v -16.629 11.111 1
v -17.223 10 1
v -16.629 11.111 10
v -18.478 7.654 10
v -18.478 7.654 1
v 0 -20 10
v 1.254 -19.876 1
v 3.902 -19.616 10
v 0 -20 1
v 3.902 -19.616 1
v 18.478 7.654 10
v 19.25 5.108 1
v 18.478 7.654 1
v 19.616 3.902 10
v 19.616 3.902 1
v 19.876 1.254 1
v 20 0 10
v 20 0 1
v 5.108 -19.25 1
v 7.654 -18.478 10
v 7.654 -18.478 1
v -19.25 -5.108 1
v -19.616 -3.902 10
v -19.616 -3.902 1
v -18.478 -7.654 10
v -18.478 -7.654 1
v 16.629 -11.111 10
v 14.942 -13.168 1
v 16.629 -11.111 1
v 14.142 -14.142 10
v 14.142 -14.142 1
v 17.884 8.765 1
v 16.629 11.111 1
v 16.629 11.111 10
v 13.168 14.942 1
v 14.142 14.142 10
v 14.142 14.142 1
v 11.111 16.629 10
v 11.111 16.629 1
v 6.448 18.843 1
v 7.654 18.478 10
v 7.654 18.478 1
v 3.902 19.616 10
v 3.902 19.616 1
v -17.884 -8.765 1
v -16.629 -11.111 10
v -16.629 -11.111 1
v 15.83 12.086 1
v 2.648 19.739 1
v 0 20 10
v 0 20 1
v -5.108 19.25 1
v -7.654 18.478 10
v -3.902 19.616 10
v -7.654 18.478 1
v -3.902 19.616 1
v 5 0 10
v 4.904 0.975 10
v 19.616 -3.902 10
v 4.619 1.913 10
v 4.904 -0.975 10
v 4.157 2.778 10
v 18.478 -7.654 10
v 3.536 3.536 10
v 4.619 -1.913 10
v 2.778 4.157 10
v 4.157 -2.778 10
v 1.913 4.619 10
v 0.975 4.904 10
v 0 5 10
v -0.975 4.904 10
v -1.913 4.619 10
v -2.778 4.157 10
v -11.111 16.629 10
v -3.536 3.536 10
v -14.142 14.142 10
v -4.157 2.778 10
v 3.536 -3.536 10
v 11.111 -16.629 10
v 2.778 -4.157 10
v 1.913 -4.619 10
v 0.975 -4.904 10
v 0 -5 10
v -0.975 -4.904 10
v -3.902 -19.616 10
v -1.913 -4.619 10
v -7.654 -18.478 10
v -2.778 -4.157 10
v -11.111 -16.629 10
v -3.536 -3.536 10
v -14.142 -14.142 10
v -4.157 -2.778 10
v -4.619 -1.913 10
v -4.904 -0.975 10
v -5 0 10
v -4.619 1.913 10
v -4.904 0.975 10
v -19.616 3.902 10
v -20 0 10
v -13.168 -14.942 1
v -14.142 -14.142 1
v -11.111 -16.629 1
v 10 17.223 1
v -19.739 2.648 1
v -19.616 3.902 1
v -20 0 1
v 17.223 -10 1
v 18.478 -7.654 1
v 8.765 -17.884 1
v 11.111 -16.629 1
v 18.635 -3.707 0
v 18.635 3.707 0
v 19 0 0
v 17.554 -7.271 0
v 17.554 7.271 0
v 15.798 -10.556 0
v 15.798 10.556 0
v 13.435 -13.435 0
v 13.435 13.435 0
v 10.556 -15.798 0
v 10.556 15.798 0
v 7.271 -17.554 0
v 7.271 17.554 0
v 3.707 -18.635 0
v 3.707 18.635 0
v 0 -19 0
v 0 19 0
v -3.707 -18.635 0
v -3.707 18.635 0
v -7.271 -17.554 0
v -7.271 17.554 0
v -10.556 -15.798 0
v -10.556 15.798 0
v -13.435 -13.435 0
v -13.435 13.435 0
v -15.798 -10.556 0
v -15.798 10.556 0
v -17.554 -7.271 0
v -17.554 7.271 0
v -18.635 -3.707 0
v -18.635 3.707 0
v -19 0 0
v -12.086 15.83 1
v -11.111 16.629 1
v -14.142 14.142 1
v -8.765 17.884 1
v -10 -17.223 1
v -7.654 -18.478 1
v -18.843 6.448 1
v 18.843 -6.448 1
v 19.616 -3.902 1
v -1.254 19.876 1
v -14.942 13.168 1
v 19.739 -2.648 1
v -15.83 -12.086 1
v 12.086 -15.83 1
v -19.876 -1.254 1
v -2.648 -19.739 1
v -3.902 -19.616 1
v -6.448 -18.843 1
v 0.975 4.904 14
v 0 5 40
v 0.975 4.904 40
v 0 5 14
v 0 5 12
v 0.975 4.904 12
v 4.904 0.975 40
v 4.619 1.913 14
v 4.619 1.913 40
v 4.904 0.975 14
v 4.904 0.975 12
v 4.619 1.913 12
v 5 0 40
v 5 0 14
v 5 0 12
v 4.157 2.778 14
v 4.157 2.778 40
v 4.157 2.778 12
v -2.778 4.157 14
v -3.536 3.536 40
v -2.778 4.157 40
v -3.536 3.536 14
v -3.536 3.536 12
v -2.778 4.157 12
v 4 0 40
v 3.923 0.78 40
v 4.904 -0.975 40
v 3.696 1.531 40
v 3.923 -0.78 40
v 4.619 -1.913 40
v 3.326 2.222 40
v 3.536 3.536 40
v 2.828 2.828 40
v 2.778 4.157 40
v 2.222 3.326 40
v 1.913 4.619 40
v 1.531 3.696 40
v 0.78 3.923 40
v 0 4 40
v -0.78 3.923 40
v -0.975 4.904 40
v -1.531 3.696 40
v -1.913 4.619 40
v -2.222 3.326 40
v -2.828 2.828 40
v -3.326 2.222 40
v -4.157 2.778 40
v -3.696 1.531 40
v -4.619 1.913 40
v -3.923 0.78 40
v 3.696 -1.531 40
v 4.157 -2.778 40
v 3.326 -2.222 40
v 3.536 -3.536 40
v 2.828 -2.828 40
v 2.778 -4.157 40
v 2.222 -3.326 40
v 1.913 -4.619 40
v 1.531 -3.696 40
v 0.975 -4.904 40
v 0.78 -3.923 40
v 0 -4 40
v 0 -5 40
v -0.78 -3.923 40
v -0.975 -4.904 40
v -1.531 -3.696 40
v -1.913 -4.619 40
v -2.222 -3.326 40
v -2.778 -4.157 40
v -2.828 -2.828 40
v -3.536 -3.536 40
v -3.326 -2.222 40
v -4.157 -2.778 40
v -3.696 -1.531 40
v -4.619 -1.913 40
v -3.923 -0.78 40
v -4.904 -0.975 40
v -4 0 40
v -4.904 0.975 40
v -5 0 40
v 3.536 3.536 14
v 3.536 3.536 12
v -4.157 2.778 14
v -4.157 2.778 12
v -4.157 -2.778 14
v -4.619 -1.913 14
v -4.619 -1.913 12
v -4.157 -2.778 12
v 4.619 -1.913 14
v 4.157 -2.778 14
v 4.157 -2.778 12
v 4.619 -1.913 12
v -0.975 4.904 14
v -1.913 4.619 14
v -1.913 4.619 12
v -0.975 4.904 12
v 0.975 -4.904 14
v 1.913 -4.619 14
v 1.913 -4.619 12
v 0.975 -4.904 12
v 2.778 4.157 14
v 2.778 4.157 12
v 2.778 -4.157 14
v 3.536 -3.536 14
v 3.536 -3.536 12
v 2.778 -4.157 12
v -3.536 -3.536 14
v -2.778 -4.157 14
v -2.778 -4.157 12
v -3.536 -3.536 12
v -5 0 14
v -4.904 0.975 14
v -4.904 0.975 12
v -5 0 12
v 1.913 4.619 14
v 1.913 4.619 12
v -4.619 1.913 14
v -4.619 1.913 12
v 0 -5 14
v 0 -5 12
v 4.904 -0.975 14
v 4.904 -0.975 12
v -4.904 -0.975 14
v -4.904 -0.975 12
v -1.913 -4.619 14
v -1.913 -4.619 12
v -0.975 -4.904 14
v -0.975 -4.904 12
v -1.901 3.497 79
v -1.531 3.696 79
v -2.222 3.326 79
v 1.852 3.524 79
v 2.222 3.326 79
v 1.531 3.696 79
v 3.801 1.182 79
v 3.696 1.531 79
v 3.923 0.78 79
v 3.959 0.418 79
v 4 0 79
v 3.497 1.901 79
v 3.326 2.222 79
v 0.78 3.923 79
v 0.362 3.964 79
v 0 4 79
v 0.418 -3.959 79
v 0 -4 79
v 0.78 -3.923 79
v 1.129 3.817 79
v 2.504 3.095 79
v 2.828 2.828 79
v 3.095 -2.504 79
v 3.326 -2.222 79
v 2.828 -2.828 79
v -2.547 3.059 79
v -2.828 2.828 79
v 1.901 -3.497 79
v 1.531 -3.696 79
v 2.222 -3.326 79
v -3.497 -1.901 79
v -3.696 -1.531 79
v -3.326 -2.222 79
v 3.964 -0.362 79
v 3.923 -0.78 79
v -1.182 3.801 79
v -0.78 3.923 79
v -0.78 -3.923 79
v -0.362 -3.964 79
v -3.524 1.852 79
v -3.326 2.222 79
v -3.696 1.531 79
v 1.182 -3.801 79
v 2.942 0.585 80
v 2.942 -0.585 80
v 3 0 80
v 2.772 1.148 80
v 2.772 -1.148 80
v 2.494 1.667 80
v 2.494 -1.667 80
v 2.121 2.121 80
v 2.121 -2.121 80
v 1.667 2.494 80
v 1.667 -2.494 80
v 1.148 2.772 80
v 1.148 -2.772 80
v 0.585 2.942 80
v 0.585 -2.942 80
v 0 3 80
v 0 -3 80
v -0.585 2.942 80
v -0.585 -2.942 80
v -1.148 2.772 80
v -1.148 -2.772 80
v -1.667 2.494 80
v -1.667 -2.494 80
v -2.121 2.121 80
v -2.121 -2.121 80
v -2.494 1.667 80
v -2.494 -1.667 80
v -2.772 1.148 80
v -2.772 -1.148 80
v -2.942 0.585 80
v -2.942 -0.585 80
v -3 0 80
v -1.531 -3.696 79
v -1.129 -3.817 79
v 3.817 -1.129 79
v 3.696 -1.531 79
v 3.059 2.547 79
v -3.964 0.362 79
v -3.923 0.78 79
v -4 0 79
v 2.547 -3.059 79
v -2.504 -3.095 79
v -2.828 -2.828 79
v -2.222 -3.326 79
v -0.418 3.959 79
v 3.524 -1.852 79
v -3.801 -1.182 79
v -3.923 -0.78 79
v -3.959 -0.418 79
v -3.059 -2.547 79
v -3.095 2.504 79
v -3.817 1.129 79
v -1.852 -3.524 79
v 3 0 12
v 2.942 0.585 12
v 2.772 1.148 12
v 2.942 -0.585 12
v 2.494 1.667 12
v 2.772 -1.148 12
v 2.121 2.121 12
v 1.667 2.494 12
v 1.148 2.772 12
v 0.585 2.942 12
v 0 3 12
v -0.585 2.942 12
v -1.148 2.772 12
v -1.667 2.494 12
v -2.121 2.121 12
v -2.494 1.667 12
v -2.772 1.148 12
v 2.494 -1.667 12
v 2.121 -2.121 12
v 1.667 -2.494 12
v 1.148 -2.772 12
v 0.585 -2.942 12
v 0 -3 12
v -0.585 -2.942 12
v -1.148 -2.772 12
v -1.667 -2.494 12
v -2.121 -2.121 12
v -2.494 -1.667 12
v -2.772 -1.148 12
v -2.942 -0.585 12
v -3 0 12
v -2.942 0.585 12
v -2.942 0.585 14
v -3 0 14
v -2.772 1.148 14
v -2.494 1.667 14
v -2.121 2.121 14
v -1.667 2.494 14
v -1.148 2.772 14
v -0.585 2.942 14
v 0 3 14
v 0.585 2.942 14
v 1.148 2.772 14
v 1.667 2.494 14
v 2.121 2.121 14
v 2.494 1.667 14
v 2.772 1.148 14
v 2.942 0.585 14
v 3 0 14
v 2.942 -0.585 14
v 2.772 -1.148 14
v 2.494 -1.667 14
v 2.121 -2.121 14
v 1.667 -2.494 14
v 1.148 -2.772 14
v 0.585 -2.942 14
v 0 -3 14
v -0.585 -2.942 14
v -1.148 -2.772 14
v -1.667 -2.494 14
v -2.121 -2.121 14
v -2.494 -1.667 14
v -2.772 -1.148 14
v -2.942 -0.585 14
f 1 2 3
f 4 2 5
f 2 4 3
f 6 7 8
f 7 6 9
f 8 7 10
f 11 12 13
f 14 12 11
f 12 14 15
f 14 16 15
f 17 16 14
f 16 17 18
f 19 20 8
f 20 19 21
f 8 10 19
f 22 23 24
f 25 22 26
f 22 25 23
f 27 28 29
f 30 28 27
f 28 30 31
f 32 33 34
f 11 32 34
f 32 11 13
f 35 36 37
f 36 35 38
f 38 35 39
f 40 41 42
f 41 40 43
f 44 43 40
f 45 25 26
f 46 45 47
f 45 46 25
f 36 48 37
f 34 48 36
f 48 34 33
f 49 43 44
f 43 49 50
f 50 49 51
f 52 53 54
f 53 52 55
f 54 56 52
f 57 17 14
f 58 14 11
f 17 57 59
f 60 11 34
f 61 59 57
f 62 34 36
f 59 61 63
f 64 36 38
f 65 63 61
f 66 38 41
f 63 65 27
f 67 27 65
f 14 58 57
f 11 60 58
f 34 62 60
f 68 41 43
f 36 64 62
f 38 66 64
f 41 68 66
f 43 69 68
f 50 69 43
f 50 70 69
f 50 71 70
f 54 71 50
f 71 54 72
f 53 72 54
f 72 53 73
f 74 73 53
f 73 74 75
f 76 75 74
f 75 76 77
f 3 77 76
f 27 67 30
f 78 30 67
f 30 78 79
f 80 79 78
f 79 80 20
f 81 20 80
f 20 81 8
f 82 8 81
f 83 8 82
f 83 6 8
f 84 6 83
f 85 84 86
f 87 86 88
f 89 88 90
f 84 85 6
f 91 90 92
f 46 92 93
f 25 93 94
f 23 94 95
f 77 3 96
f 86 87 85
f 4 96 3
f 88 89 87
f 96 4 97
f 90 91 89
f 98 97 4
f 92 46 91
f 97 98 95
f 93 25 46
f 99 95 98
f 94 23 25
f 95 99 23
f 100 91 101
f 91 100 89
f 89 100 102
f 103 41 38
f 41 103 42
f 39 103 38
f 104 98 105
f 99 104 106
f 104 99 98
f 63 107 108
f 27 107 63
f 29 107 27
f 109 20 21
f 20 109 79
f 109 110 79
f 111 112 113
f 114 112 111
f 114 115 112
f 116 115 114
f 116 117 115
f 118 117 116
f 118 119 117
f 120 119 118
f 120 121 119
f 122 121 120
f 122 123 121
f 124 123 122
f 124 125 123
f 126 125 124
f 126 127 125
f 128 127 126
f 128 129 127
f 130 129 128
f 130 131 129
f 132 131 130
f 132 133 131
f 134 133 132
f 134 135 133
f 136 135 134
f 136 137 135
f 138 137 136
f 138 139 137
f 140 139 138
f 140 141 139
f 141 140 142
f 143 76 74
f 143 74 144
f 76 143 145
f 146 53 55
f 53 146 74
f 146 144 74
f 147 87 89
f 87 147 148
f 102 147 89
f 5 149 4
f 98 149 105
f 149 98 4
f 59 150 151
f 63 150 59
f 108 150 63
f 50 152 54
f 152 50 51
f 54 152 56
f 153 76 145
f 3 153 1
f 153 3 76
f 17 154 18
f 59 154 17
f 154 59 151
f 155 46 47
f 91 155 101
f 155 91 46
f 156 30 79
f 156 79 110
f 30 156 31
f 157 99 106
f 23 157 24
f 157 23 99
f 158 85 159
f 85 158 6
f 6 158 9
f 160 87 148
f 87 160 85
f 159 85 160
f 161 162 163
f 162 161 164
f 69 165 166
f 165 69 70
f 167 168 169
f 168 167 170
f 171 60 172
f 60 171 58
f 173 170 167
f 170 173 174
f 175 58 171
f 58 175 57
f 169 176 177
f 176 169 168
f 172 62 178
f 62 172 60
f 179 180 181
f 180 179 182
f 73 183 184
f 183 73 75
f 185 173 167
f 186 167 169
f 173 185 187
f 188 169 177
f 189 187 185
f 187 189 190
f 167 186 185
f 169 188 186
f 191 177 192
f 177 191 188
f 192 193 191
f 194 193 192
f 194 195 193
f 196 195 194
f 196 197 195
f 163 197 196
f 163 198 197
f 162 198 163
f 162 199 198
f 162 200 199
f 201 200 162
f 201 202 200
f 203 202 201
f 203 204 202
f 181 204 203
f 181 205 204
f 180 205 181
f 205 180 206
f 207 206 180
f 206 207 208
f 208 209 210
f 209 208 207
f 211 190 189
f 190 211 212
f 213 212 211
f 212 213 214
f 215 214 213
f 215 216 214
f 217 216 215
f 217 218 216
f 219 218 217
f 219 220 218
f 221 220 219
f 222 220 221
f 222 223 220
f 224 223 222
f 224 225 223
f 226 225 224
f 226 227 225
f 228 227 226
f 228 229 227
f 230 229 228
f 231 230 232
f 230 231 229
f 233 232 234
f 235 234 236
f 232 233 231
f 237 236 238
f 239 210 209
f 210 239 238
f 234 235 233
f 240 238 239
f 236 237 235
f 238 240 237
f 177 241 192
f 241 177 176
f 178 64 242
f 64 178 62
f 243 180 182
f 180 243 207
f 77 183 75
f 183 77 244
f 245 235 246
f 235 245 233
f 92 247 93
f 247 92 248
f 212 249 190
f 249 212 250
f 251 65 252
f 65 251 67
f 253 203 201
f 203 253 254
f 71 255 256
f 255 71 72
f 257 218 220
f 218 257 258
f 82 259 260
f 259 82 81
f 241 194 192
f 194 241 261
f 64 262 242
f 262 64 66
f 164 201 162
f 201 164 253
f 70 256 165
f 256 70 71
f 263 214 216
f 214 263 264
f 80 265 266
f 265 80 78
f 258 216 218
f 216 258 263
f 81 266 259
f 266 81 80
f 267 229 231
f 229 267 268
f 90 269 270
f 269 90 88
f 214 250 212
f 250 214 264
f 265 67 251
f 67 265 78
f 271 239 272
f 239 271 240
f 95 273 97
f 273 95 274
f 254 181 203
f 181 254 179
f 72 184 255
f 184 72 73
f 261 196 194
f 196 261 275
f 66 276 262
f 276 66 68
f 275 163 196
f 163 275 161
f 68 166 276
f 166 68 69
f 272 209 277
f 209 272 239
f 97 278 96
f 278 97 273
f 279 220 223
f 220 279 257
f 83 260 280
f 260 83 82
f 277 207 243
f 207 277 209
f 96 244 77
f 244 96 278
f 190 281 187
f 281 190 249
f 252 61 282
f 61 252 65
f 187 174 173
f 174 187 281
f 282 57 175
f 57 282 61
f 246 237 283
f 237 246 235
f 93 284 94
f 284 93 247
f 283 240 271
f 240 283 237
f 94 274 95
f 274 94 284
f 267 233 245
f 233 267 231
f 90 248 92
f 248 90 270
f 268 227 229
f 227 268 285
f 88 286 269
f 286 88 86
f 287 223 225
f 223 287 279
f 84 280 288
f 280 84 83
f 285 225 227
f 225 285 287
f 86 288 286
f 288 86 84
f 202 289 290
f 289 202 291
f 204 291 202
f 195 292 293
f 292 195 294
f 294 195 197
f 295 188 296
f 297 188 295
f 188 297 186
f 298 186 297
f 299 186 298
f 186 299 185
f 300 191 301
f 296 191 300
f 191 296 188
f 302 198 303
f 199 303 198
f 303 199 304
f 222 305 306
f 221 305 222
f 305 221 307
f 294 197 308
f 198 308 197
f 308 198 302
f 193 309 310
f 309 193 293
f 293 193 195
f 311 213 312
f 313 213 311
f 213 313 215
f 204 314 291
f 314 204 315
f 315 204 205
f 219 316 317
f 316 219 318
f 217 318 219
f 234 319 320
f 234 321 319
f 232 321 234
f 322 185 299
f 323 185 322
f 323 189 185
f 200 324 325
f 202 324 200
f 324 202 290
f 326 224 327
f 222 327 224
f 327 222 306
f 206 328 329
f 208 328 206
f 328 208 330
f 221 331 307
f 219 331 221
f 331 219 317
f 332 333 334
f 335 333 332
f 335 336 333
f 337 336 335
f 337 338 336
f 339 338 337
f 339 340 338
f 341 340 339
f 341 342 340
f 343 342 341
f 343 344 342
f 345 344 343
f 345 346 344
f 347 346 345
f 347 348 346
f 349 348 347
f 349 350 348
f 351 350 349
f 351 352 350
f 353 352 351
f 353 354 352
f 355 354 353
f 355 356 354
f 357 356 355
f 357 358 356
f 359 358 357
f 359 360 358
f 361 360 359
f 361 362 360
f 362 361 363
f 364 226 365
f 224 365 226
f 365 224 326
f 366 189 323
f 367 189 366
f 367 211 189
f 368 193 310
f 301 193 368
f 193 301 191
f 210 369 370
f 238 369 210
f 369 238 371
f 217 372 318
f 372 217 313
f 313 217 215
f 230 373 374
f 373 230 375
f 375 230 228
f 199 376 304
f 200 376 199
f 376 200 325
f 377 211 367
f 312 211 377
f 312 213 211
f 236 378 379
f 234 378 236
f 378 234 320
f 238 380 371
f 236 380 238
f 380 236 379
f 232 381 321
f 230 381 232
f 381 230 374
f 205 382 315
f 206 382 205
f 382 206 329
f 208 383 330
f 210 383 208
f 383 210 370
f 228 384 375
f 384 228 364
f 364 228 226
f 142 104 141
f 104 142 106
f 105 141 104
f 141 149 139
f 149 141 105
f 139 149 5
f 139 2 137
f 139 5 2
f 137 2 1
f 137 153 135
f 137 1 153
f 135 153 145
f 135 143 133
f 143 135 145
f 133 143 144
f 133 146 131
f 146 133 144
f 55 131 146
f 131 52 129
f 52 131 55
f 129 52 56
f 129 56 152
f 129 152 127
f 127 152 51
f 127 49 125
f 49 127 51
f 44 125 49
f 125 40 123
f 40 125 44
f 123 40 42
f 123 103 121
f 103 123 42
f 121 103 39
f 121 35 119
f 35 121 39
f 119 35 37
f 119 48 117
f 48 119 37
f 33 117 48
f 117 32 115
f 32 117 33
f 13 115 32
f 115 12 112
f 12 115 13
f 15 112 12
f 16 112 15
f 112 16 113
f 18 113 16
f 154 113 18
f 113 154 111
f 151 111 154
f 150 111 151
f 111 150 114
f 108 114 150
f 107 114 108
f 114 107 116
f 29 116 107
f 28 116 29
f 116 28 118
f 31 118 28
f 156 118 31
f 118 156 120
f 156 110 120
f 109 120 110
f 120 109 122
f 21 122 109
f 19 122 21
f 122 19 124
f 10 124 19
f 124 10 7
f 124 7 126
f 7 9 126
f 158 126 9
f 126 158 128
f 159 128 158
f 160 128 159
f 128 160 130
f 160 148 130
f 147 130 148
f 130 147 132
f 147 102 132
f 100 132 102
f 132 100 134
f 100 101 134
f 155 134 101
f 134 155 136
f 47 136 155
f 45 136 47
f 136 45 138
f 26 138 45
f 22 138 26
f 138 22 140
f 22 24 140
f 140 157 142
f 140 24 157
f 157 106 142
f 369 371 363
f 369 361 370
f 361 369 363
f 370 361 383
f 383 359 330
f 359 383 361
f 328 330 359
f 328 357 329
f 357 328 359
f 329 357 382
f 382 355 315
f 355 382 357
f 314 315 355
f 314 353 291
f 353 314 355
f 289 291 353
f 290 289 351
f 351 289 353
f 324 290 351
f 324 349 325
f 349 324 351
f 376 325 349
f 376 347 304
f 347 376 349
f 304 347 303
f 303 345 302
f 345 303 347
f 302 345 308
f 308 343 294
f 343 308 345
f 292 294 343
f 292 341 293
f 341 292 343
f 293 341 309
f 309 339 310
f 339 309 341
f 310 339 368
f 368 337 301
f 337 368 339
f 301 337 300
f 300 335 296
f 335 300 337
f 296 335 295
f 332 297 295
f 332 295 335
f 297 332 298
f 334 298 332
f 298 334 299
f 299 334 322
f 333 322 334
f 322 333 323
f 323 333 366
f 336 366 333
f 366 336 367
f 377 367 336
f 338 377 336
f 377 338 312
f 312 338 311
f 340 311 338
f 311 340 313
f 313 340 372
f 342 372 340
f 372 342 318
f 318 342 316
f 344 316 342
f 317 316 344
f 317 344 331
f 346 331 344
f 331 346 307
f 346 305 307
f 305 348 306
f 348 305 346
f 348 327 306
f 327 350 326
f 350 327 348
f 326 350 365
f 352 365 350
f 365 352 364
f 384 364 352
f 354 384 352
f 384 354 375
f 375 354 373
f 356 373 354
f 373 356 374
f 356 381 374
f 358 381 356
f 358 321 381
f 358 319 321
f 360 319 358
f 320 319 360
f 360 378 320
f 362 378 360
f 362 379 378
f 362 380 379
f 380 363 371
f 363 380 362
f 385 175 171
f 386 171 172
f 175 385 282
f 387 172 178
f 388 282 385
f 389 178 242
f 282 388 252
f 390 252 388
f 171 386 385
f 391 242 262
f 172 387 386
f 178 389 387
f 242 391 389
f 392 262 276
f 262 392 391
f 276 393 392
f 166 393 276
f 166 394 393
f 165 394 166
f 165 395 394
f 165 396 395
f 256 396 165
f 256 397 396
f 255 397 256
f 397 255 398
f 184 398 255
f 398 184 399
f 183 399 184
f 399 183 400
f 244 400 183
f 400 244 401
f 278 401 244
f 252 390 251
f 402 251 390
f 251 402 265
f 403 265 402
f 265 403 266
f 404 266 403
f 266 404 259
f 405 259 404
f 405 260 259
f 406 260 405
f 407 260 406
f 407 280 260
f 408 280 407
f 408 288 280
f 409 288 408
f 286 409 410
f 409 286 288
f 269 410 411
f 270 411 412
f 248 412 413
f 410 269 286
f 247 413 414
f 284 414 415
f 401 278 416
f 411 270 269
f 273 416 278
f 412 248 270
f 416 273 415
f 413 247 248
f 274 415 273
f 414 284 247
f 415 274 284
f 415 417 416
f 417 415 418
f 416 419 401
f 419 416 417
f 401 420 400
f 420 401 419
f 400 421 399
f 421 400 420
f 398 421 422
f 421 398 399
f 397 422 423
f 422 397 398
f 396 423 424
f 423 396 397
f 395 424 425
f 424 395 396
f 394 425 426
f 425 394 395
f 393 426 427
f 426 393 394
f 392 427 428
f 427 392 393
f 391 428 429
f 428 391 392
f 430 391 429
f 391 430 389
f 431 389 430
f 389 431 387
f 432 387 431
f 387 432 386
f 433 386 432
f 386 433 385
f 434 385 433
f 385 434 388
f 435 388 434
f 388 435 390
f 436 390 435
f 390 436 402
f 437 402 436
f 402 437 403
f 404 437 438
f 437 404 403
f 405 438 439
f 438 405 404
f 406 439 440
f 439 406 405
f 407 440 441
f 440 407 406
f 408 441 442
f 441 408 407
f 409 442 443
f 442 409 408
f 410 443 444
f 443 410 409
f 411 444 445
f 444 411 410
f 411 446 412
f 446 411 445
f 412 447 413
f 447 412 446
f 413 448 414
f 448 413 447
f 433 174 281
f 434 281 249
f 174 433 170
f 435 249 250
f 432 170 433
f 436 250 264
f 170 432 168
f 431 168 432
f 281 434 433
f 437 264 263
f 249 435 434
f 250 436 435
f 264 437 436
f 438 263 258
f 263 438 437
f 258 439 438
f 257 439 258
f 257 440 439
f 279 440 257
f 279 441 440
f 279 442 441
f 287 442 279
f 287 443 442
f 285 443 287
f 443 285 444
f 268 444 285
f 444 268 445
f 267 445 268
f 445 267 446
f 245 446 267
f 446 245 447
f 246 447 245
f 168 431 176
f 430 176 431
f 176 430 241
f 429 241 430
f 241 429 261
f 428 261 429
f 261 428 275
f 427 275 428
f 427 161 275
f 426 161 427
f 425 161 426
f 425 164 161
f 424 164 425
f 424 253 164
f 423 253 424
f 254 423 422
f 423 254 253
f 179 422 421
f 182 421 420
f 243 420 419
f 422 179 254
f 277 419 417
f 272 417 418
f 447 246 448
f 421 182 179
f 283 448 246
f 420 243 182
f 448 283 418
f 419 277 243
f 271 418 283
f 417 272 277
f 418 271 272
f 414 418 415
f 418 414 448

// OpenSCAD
$fn = 32;

// ----------------------------------------------------------------------
// Stepped shaft: diameters 40, 10, 8 mm, 80 mm long
// ----------------------------------------------------------------------

// --- parameters (mm) ---
d1 = 40;                  // step 1 diameter
len1 = 10;                // step 1 length
d2 = 10;                  // step 2 diameter
len2 = 30;                // step 2 length
d3 = 8;                   // step 3 diameter
len3 = 40;                // step 3 length
total = 80;               // overall length
chamfer = 1;              // end chamfer
groove_r = 5;             // groove radius
groove_z = 12;            // groove position from the end
groove_w = 2;             // groove width
groove_d = 2;             // groove depth

difference() {
  /* turned body: stacked cylinders, every step sunk into the bigger one */
  union() {
    cylinder(h = len1, d = d1);
    translate([0, 0, 9.6]) cylinder(h = 30.4, d = d2);
    translate([0, 0, 39.6]) cylinder(h = 40.4, d = d3);
  }
  /* bottom chamfer ring cut */
  rotate_extrude() translate([19, -2.5]) polygon([[0, 0], [3.5, 0], [3.5, 6], [0, 2.5]]);
  /* top chamfer ring cut */
  rotate_extrude() translate([3, 80]) polygon([[0, 0], [3.5, -3.5], [3.5, 2.5], [0, 2.5]]);
  /* circlip groove just behind the shoulder */
  rotate_extrude() translate([groove_r - groove_d, groove_z]) square([groove_d + 2.5, groove_w]);
}
